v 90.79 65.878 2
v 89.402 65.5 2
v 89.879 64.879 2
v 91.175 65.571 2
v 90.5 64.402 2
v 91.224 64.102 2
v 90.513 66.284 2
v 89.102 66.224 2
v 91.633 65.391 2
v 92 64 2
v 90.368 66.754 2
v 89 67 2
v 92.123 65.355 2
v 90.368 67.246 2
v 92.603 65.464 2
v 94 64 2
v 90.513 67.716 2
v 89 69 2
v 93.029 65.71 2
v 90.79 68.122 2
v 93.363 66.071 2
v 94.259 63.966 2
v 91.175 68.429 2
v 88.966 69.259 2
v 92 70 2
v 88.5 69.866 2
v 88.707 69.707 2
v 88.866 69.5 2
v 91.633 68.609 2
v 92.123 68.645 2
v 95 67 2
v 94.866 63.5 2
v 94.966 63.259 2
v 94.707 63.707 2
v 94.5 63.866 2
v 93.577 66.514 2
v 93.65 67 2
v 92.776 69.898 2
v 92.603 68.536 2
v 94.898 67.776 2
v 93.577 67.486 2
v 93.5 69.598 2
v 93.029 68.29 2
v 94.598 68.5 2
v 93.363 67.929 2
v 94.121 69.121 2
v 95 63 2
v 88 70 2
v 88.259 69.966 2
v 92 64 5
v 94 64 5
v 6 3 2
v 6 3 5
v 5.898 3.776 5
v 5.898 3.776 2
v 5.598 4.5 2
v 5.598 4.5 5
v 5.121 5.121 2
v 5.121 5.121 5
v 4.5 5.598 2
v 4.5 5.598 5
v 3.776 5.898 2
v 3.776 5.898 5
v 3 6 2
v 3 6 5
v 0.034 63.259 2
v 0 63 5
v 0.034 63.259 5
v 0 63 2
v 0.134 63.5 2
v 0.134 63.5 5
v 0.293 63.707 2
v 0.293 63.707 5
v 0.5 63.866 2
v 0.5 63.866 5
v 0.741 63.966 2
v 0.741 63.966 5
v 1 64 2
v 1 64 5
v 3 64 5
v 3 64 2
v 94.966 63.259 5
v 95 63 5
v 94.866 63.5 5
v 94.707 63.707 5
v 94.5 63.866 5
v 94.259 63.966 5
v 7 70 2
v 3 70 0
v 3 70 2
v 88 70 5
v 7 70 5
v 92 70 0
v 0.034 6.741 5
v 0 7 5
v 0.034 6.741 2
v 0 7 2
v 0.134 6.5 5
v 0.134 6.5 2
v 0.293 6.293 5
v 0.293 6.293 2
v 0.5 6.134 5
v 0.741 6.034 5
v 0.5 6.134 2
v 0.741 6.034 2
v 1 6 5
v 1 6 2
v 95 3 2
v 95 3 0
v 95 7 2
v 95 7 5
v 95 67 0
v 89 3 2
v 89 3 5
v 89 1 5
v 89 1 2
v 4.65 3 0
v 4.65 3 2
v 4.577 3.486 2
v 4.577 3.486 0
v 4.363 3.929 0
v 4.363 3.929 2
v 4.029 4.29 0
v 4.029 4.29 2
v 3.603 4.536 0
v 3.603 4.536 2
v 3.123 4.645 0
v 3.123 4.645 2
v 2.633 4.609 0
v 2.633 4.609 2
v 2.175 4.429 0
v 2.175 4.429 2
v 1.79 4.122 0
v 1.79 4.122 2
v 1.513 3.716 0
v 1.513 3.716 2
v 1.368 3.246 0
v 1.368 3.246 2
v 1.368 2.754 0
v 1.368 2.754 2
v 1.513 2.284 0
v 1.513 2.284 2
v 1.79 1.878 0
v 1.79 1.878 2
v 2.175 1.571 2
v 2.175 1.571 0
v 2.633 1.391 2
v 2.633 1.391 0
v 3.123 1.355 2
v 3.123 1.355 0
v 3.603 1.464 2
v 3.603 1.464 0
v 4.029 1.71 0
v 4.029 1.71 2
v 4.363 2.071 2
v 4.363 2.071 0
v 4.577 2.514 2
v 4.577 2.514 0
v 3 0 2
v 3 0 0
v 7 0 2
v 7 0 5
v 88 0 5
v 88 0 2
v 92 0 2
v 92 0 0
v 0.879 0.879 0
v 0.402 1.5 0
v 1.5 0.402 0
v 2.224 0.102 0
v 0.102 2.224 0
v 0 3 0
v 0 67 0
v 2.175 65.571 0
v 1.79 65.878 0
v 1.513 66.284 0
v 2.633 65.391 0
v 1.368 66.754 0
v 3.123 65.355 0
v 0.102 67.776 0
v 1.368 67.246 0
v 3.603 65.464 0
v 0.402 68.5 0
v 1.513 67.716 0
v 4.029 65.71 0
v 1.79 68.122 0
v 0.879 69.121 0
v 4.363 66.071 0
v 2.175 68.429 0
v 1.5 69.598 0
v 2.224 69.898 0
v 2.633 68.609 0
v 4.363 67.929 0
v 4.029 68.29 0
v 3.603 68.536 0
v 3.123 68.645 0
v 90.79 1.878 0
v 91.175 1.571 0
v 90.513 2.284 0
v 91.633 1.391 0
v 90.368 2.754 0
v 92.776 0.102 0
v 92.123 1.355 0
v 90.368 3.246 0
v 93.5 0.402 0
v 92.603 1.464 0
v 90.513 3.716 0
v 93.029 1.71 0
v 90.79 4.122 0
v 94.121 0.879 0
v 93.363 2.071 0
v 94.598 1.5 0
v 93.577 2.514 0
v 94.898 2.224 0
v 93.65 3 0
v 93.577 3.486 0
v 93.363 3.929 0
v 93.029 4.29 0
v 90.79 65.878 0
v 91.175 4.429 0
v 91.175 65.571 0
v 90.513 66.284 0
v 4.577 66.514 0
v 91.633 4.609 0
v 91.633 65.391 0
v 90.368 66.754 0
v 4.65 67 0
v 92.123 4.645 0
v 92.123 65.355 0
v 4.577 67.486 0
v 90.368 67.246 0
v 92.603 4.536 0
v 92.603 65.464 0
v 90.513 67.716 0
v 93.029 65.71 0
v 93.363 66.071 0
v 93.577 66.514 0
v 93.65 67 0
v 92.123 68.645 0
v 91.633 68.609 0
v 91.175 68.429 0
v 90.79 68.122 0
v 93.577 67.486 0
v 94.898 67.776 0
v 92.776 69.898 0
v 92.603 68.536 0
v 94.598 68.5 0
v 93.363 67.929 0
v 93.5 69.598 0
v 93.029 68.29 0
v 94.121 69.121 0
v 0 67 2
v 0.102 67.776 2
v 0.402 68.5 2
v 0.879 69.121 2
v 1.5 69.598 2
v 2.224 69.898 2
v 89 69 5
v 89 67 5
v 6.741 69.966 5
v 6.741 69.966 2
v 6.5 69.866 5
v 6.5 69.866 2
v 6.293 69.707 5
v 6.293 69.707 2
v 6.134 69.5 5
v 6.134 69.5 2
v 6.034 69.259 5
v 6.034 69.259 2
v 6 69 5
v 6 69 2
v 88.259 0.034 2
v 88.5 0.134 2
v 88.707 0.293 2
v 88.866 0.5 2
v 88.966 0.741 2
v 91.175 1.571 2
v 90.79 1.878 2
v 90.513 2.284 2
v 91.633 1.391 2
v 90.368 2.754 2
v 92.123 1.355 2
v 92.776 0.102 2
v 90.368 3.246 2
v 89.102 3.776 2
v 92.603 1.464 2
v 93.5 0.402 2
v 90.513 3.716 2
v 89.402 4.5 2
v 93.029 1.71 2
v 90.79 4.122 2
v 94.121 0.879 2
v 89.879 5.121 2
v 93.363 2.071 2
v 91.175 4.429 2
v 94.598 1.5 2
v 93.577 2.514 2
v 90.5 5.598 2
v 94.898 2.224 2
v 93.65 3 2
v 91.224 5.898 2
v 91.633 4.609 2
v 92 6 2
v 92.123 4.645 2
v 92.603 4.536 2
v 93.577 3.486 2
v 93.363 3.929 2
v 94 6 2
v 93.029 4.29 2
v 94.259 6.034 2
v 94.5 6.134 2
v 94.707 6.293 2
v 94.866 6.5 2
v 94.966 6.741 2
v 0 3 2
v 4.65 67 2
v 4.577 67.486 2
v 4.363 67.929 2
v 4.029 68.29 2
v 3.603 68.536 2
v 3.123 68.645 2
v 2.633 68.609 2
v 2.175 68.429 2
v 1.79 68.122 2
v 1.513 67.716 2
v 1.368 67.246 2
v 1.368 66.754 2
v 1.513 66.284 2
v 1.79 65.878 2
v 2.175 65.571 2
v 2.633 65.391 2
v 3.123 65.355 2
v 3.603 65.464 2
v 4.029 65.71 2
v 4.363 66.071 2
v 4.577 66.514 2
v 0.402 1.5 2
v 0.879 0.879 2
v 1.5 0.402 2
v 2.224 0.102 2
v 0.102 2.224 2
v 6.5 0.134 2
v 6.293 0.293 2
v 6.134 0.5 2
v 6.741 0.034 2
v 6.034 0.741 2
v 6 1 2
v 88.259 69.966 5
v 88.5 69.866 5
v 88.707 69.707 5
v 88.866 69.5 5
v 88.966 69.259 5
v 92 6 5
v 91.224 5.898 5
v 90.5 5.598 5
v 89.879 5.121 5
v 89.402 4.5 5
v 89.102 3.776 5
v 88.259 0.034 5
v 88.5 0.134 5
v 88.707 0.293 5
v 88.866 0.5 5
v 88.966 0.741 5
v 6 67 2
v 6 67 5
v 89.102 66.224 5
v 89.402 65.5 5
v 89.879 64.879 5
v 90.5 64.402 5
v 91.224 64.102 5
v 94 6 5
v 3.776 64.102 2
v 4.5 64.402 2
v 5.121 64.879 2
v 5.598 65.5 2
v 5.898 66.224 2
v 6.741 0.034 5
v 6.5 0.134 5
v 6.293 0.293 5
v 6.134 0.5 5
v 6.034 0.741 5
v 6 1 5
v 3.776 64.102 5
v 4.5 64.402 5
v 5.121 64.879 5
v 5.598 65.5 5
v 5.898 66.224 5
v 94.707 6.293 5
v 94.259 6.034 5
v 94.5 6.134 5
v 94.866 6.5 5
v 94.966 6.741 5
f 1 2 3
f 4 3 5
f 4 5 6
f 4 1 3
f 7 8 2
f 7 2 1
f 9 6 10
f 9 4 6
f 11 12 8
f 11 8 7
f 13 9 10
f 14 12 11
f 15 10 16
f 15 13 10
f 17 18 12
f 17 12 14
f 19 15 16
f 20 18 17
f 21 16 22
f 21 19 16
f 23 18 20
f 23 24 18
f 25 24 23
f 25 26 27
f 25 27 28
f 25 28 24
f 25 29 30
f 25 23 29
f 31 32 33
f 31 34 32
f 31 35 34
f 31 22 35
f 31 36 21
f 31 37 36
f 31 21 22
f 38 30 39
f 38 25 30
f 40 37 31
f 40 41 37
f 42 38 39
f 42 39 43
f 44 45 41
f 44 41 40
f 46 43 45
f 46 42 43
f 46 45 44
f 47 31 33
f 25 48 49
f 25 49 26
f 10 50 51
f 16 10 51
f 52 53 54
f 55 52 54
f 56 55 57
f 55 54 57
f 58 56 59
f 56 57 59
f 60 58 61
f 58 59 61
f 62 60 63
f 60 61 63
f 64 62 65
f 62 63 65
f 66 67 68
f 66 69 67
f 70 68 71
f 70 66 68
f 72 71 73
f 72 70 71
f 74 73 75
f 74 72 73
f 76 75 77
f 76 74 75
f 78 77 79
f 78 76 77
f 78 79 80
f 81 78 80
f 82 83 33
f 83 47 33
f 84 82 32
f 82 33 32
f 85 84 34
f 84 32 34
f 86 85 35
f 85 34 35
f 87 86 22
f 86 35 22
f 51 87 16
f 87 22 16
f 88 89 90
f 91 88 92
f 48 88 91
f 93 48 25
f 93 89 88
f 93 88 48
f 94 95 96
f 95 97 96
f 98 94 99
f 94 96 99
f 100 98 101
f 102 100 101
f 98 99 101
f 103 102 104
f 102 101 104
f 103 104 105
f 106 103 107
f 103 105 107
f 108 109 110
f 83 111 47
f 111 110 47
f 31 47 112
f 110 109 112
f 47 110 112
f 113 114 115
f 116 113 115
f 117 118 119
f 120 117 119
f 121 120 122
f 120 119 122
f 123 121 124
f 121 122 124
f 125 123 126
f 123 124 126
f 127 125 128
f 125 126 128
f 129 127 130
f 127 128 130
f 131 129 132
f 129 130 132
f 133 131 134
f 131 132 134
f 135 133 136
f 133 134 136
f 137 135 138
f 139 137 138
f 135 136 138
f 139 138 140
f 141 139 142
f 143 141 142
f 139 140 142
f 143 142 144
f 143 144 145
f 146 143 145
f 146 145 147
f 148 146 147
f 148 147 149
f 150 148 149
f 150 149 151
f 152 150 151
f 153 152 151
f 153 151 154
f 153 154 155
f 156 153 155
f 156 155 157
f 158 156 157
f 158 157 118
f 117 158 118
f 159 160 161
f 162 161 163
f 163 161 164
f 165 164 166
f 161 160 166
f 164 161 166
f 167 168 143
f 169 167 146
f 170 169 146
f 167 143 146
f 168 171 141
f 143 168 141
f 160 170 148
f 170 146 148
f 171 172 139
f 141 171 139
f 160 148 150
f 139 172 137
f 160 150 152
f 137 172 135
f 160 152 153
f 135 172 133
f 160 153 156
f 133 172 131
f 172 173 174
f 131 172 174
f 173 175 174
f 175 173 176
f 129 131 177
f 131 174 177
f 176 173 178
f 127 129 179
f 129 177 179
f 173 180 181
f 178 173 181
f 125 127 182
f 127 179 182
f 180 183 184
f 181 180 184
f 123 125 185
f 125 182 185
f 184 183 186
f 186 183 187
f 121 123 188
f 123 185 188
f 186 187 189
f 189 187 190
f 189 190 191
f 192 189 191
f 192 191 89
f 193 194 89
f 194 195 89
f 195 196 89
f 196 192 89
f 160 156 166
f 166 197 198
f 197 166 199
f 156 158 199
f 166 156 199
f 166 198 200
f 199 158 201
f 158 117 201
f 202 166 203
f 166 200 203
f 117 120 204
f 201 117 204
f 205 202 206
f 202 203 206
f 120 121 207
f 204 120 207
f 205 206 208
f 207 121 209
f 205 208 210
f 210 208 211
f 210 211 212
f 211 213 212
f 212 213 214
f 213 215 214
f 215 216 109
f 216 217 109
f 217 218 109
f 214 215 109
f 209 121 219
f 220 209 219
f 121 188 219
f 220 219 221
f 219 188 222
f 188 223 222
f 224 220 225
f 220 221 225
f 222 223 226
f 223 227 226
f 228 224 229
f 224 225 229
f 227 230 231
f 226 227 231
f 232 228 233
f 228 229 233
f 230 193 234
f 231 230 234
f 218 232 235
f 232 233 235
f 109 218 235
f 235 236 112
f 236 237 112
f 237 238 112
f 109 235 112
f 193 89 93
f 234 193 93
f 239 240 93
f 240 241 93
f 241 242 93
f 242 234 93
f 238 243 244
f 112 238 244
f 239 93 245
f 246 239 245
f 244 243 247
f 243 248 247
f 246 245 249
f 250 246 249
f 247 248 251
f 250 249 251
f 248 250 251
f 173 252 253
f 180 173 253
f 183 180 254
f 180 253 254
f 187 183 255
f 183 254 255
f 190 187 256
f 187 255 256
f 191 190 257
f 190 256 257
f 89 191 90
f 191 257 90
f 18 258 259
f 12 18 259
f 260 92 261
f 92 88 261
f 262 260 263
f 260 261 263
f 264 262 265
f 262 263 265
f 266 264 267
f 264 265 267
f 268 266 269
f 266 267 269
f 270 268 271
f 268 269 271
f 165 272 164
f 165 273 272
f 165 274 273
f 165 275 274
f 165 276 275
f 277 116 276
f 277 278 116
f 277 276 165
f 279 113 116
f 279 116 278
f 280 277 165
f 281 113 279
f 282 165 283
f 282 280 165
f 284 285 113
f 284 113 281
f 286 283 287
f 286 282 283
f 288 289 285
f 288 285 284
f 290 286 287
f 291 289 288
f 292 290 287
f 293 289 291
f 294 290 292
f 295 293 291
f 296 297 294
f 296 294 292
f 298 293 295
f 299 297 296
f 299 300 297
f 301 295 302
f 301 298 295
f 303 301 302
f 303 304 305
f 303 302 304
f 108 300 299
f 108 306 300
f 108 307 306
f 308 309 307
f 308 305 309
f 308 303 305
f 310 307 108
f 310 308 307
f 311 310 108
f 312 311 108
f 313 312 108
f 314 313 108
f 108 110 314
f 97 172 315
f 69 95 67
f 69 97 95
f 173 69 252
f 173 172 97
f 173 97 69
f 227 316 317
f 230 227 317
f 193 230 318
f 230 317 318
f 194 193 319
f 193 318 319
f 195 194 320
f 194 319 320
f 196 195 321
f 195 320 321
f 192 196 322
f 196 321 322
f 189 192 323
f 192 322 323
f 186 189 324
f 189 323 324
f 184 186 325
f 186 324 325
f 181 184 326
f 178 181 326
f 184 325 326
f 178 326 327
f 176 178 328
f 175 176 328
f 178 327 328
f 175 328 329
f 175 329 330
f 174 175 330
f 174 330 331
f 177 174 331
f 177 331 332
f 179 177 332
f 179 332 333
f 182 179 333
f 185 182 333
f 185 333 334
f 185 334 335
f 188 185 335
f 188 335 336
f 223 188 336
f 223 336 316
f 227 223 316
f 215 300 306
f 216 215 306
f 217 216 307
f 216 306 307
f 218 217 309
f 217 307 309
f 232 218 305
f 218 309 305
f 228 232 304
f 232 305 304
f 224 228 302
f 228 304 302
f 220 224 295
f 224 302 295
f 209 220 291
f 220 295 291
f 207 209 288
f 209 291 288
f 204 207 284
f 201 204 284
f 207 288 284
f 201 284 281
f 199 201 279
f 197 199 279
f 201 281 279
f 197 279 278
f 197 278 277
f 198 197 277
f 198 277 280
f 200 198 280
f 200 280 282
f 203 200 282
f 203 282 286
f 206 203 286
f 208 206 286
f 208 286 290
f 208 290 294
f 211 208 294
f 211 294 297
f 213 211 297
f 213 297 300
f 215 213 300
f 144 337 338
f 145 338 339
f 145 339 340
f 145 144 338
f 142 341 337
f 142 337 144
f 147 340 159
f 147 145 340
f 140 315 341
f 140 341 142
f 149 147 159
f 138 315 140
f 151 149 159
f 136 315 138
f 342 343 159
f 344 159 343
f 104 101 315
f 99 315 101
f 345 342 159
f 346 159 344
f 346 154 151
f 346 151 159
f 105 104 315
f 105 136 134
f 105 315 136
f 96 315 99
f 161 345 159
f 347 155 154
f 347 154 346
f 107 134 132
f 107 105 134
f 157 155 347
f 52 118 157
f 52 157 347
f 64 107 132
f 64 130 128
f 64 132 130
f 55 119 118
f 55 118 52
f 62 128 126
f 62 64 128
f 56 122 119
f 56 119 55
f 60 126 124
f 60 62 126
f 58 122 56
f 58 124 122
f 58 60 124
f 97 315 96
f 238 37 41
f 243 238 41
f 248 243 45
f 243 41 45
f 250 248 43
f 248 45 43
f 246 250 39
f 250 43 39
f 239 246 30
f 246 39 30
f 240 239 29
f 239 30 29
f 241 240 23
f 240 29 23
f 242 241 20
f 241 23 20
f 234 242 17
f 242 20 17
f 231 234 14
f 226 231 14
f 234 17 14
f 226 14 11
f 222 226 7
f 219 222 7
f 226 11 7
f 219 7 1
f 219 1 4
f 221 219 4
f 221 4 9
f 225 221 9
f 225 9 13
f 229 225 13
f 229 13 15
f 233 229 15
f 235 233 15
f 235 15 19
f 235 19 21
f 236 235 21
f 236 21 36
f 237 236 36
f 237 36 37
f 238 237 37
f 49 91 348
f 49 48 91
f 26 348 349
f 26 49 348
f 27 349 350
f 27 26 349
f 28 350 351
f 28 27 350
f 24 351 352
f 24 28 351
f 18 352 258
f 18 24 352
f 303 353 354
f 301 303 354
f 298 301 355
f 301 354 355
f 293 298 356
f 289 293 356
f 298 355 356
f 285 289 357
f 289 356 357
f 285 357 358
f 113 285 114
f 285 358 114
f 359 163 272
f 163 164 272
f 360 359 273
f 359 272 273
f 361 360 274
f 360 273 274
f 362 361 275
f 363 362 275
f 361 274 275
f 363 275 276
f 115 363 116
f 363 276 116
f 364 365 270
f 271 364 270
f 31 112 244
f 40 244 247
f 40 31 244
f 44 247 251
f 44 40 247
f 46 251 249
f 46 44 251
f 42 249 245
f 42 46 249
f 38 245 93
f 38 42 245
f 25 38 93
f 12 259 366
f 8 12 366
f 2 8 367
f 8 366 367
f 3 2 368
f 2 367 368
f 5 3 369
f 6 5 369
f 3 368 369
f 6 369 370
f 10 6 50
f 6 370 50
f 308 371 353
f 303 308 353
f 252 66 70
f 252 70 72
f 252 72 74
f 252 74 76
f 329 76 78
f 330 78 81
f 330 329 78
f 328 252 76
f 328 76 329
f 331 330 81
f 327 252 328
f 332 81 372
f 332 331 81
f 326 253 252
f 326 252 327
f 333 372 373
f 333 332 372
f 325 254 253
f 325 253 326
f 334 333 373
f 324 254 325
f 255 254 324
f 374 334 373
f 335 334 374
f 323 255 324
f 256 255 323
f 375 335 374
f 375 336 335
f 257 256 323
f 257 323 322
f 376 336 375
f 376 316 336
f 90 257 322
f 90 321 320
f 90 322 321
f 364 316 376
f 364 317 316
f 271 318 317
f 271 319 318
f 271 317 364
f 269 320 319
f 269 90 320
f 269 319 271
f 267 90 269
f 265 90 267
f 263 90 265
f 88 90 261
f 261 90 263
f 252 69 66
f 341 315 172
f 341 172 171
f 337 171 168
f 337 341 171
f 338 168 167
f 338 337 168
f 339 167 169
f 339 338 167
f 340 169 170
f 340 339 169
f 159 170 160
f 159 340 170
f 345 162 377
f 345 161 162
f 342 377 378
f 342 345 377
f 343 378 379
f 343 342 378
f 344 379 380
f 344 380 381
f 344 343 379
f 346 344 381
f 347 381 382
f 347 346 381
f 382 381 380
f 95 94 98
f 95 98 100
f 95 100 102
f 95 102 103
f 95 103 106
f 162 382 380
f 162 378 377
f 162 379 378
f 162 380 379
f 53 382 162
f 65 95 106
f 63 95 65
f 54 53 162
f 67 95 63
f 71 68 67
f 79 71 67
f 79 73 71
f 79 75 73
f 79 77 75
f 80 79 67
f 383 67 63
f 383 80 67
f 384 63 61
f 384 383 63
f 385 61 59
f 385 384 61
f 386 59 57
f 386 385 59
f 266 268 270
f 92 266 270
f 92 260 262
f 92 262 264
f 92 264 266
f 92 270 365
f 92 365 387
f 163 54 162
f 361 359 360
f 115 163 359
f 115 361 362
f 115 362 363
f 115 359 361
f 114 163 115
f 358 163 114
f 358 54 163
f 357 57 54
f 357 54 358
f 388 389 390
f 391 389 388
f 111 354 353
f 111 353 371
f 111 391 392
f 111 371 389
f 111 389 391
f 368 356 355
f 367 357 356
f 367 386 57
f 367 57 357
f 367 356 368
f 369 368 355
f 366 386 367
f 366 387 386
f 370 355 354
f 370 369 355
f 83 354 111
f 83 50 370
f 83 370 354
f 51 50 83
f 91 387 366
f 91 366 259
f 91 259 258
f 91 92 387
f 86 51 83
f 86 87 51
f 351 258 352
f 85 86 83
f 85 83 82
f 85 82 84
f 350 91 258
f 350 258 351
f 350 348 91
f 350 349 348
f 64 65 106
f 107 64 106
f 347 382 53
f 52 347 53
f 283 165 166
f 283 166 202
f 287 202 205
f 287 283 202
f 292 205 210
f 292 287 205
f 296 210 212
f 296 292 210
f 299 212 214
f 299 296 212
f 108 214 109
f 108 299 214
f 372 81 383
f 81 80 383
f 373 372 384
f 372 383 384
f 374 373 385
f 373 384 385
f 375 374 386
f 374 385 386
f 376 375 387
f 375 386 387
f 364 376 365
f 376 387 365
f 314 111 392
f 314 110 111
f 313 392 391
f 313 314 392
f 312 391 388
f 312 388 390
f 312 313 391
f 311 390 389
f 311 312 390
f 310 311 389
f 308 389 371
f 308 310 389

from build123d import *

# Parameters (mm, degrees)
SKETCH_1_W          = 95
SKETCH_1_H          = 70
EXTRUDE_1_DEPTH     = 5
FILLET_1_R          = 3
SKETCH_13_R         = 1.65
CUT_EXTRUDE_2_DEPTH = 5
SKETCH_14_R         = 3
CUT_EXTRUDE_3_DEPTH = 3
CUT_EXTRUDE_4_DEPTH = 3
FILLET_3_R          = 1


with BuildPart() as part:
    # ｽｹｯﾁ1 → ﾎﾞｽ - 押し出し1 (new body)
    with BuildSketch(Plane.XY):
        with Locations((47.5, 35)):
            Rectangle(SKETCH_1_W, SKETCH_1_H)
    extrude(amount=EXTRUDE_1_DEPTH)

    # ﾌｨﾚｯﾄ1
    fillet_1_edges = [part.edges().sort_by_distance(p)[0] for p in [
        (0, 70, 2.5),
        (95, 70, 2.5),
        (95, 0, 2.5),
        (0, 0, 2.5),
    ]]
    fillet(fillet_1_edges, radius=FILLET_1_R)

    # ｽｹｯﾁ13 → ｶｯﾄ - 押し出し2 (cut)
    with BuildSketch(Plane.XY.offset(5)):
        with Locations((3, 67)):
            Circle(SKETCH_13_R)
        with Locations((92, 67)):
            Circle(SKETCH_13_R)
        with Locations((3, 3)):
            Circle(SKETCH_13_R)
        with Locations((92, 3)):
            Circle(SKETCH_13_R)
    extrude(amount=-CUT_EXTRUDE_2_DEPTH, mode=Mode.SUBTRACT)

    # ｽｹｯﾁ14 → ｶｯﾄ - 押し出し3 (cut)
    with BuildSketch(Plane.XY.offset(5)):
        with Locations((3, 67)):
            Circle(SKETCH_14_R)
        with Locations((92, 67)):
            Circle(SKETCH_14_R)
        with Locations((3, 3)):
            Circle(SKETCH_14_R)
        with Locations((92, 3)):
            Circle(SKETCH_14_R)
    extrude(amount=-CUT_EXTRUDE_3_DEPTH, mode=Mode.SUBTRACT)

    # ｽｹｯﾁ15 → ｶｯﾄ - 押し出し4 (cut)
    with BuildSketch(Plane.XY.offset(5)):
        with BuildLine():
            Line((95, 3), (95, 6))
            Line((95, 6), (92, 6))
            ThreePointArc((92, 6), (94.121320344, 5.121320344), (95, 3))
        make_face()
        with BuildLine():
            Line((89, 3), (89, 0))
            Line((89, 0), (92, 0))
            ThreePointArc((92, 0), (89.878679656, 0.878679656), (89, 3))
        make_face()
        with BuildLine():
            Line((6, 0), (6, 3))
            ThreePointArc((6, 3), (5.121320344, 0.878679656), (3, 0))
            Line((3, 0), (6, 0))
        make_face()
        with BuildLine():
            Line((3, 6), (0, 6))
            Line((0, 6), (0, 3))
            ThreePointArc((0, 3), (0.878679656, 5.121320344), (3, 6))
        make_face()
        with BuildLine():
            Line((0, 64), (3, 64))
            ThreePointArc((3, 64), (0.878679656, 64.878679656), (0, 67))
            Line((0, 67), (0, 64))
        make_face()
        with BuildLine():
            ThreePointArc((3, 70), (5.121320344, 69.121320344), (6, 67))
            Line((6, 67), (6, 70))
            Line((6, 70), (3, 70))
        make_face()
        with BuildLine():
            Line((92, 70), (89, 70))
            Line((89, 70), (89, 67))
            ThreePointArc((89, 67), (89.878679656, 69.121320344), (92, 70))
        make_face()
        with BuildLine():
            ThreePointArc((95, 67), (94.121320344, 64.878679656), (92, 64))
            Line((92, 64), (95, 64))
            Line((95, 64), (95, 67))
        make_face()
    extrude(amount=-CUT_EXTRUDE_4_DEPTH, mode=Mode.SUBTRACT)

    # ﾌｨﾚｯﾄ3
    fillet_3_edges = [part.edges().sort_by_distance(p)[0] for p in [
        (0, 64, 3.5),
        (0, 6, 3.5),
        (6, 0, 3.5),
        (89, 0, 3.5),
        (95, 64, 3.5),
        (89, 70, 3.5),
        (6, 70, 3.5),
        (95, 6, 3.5),
    ]]
    fillet(fillet_3_edges, radius=FILLET_3_R)


solid = part.part
